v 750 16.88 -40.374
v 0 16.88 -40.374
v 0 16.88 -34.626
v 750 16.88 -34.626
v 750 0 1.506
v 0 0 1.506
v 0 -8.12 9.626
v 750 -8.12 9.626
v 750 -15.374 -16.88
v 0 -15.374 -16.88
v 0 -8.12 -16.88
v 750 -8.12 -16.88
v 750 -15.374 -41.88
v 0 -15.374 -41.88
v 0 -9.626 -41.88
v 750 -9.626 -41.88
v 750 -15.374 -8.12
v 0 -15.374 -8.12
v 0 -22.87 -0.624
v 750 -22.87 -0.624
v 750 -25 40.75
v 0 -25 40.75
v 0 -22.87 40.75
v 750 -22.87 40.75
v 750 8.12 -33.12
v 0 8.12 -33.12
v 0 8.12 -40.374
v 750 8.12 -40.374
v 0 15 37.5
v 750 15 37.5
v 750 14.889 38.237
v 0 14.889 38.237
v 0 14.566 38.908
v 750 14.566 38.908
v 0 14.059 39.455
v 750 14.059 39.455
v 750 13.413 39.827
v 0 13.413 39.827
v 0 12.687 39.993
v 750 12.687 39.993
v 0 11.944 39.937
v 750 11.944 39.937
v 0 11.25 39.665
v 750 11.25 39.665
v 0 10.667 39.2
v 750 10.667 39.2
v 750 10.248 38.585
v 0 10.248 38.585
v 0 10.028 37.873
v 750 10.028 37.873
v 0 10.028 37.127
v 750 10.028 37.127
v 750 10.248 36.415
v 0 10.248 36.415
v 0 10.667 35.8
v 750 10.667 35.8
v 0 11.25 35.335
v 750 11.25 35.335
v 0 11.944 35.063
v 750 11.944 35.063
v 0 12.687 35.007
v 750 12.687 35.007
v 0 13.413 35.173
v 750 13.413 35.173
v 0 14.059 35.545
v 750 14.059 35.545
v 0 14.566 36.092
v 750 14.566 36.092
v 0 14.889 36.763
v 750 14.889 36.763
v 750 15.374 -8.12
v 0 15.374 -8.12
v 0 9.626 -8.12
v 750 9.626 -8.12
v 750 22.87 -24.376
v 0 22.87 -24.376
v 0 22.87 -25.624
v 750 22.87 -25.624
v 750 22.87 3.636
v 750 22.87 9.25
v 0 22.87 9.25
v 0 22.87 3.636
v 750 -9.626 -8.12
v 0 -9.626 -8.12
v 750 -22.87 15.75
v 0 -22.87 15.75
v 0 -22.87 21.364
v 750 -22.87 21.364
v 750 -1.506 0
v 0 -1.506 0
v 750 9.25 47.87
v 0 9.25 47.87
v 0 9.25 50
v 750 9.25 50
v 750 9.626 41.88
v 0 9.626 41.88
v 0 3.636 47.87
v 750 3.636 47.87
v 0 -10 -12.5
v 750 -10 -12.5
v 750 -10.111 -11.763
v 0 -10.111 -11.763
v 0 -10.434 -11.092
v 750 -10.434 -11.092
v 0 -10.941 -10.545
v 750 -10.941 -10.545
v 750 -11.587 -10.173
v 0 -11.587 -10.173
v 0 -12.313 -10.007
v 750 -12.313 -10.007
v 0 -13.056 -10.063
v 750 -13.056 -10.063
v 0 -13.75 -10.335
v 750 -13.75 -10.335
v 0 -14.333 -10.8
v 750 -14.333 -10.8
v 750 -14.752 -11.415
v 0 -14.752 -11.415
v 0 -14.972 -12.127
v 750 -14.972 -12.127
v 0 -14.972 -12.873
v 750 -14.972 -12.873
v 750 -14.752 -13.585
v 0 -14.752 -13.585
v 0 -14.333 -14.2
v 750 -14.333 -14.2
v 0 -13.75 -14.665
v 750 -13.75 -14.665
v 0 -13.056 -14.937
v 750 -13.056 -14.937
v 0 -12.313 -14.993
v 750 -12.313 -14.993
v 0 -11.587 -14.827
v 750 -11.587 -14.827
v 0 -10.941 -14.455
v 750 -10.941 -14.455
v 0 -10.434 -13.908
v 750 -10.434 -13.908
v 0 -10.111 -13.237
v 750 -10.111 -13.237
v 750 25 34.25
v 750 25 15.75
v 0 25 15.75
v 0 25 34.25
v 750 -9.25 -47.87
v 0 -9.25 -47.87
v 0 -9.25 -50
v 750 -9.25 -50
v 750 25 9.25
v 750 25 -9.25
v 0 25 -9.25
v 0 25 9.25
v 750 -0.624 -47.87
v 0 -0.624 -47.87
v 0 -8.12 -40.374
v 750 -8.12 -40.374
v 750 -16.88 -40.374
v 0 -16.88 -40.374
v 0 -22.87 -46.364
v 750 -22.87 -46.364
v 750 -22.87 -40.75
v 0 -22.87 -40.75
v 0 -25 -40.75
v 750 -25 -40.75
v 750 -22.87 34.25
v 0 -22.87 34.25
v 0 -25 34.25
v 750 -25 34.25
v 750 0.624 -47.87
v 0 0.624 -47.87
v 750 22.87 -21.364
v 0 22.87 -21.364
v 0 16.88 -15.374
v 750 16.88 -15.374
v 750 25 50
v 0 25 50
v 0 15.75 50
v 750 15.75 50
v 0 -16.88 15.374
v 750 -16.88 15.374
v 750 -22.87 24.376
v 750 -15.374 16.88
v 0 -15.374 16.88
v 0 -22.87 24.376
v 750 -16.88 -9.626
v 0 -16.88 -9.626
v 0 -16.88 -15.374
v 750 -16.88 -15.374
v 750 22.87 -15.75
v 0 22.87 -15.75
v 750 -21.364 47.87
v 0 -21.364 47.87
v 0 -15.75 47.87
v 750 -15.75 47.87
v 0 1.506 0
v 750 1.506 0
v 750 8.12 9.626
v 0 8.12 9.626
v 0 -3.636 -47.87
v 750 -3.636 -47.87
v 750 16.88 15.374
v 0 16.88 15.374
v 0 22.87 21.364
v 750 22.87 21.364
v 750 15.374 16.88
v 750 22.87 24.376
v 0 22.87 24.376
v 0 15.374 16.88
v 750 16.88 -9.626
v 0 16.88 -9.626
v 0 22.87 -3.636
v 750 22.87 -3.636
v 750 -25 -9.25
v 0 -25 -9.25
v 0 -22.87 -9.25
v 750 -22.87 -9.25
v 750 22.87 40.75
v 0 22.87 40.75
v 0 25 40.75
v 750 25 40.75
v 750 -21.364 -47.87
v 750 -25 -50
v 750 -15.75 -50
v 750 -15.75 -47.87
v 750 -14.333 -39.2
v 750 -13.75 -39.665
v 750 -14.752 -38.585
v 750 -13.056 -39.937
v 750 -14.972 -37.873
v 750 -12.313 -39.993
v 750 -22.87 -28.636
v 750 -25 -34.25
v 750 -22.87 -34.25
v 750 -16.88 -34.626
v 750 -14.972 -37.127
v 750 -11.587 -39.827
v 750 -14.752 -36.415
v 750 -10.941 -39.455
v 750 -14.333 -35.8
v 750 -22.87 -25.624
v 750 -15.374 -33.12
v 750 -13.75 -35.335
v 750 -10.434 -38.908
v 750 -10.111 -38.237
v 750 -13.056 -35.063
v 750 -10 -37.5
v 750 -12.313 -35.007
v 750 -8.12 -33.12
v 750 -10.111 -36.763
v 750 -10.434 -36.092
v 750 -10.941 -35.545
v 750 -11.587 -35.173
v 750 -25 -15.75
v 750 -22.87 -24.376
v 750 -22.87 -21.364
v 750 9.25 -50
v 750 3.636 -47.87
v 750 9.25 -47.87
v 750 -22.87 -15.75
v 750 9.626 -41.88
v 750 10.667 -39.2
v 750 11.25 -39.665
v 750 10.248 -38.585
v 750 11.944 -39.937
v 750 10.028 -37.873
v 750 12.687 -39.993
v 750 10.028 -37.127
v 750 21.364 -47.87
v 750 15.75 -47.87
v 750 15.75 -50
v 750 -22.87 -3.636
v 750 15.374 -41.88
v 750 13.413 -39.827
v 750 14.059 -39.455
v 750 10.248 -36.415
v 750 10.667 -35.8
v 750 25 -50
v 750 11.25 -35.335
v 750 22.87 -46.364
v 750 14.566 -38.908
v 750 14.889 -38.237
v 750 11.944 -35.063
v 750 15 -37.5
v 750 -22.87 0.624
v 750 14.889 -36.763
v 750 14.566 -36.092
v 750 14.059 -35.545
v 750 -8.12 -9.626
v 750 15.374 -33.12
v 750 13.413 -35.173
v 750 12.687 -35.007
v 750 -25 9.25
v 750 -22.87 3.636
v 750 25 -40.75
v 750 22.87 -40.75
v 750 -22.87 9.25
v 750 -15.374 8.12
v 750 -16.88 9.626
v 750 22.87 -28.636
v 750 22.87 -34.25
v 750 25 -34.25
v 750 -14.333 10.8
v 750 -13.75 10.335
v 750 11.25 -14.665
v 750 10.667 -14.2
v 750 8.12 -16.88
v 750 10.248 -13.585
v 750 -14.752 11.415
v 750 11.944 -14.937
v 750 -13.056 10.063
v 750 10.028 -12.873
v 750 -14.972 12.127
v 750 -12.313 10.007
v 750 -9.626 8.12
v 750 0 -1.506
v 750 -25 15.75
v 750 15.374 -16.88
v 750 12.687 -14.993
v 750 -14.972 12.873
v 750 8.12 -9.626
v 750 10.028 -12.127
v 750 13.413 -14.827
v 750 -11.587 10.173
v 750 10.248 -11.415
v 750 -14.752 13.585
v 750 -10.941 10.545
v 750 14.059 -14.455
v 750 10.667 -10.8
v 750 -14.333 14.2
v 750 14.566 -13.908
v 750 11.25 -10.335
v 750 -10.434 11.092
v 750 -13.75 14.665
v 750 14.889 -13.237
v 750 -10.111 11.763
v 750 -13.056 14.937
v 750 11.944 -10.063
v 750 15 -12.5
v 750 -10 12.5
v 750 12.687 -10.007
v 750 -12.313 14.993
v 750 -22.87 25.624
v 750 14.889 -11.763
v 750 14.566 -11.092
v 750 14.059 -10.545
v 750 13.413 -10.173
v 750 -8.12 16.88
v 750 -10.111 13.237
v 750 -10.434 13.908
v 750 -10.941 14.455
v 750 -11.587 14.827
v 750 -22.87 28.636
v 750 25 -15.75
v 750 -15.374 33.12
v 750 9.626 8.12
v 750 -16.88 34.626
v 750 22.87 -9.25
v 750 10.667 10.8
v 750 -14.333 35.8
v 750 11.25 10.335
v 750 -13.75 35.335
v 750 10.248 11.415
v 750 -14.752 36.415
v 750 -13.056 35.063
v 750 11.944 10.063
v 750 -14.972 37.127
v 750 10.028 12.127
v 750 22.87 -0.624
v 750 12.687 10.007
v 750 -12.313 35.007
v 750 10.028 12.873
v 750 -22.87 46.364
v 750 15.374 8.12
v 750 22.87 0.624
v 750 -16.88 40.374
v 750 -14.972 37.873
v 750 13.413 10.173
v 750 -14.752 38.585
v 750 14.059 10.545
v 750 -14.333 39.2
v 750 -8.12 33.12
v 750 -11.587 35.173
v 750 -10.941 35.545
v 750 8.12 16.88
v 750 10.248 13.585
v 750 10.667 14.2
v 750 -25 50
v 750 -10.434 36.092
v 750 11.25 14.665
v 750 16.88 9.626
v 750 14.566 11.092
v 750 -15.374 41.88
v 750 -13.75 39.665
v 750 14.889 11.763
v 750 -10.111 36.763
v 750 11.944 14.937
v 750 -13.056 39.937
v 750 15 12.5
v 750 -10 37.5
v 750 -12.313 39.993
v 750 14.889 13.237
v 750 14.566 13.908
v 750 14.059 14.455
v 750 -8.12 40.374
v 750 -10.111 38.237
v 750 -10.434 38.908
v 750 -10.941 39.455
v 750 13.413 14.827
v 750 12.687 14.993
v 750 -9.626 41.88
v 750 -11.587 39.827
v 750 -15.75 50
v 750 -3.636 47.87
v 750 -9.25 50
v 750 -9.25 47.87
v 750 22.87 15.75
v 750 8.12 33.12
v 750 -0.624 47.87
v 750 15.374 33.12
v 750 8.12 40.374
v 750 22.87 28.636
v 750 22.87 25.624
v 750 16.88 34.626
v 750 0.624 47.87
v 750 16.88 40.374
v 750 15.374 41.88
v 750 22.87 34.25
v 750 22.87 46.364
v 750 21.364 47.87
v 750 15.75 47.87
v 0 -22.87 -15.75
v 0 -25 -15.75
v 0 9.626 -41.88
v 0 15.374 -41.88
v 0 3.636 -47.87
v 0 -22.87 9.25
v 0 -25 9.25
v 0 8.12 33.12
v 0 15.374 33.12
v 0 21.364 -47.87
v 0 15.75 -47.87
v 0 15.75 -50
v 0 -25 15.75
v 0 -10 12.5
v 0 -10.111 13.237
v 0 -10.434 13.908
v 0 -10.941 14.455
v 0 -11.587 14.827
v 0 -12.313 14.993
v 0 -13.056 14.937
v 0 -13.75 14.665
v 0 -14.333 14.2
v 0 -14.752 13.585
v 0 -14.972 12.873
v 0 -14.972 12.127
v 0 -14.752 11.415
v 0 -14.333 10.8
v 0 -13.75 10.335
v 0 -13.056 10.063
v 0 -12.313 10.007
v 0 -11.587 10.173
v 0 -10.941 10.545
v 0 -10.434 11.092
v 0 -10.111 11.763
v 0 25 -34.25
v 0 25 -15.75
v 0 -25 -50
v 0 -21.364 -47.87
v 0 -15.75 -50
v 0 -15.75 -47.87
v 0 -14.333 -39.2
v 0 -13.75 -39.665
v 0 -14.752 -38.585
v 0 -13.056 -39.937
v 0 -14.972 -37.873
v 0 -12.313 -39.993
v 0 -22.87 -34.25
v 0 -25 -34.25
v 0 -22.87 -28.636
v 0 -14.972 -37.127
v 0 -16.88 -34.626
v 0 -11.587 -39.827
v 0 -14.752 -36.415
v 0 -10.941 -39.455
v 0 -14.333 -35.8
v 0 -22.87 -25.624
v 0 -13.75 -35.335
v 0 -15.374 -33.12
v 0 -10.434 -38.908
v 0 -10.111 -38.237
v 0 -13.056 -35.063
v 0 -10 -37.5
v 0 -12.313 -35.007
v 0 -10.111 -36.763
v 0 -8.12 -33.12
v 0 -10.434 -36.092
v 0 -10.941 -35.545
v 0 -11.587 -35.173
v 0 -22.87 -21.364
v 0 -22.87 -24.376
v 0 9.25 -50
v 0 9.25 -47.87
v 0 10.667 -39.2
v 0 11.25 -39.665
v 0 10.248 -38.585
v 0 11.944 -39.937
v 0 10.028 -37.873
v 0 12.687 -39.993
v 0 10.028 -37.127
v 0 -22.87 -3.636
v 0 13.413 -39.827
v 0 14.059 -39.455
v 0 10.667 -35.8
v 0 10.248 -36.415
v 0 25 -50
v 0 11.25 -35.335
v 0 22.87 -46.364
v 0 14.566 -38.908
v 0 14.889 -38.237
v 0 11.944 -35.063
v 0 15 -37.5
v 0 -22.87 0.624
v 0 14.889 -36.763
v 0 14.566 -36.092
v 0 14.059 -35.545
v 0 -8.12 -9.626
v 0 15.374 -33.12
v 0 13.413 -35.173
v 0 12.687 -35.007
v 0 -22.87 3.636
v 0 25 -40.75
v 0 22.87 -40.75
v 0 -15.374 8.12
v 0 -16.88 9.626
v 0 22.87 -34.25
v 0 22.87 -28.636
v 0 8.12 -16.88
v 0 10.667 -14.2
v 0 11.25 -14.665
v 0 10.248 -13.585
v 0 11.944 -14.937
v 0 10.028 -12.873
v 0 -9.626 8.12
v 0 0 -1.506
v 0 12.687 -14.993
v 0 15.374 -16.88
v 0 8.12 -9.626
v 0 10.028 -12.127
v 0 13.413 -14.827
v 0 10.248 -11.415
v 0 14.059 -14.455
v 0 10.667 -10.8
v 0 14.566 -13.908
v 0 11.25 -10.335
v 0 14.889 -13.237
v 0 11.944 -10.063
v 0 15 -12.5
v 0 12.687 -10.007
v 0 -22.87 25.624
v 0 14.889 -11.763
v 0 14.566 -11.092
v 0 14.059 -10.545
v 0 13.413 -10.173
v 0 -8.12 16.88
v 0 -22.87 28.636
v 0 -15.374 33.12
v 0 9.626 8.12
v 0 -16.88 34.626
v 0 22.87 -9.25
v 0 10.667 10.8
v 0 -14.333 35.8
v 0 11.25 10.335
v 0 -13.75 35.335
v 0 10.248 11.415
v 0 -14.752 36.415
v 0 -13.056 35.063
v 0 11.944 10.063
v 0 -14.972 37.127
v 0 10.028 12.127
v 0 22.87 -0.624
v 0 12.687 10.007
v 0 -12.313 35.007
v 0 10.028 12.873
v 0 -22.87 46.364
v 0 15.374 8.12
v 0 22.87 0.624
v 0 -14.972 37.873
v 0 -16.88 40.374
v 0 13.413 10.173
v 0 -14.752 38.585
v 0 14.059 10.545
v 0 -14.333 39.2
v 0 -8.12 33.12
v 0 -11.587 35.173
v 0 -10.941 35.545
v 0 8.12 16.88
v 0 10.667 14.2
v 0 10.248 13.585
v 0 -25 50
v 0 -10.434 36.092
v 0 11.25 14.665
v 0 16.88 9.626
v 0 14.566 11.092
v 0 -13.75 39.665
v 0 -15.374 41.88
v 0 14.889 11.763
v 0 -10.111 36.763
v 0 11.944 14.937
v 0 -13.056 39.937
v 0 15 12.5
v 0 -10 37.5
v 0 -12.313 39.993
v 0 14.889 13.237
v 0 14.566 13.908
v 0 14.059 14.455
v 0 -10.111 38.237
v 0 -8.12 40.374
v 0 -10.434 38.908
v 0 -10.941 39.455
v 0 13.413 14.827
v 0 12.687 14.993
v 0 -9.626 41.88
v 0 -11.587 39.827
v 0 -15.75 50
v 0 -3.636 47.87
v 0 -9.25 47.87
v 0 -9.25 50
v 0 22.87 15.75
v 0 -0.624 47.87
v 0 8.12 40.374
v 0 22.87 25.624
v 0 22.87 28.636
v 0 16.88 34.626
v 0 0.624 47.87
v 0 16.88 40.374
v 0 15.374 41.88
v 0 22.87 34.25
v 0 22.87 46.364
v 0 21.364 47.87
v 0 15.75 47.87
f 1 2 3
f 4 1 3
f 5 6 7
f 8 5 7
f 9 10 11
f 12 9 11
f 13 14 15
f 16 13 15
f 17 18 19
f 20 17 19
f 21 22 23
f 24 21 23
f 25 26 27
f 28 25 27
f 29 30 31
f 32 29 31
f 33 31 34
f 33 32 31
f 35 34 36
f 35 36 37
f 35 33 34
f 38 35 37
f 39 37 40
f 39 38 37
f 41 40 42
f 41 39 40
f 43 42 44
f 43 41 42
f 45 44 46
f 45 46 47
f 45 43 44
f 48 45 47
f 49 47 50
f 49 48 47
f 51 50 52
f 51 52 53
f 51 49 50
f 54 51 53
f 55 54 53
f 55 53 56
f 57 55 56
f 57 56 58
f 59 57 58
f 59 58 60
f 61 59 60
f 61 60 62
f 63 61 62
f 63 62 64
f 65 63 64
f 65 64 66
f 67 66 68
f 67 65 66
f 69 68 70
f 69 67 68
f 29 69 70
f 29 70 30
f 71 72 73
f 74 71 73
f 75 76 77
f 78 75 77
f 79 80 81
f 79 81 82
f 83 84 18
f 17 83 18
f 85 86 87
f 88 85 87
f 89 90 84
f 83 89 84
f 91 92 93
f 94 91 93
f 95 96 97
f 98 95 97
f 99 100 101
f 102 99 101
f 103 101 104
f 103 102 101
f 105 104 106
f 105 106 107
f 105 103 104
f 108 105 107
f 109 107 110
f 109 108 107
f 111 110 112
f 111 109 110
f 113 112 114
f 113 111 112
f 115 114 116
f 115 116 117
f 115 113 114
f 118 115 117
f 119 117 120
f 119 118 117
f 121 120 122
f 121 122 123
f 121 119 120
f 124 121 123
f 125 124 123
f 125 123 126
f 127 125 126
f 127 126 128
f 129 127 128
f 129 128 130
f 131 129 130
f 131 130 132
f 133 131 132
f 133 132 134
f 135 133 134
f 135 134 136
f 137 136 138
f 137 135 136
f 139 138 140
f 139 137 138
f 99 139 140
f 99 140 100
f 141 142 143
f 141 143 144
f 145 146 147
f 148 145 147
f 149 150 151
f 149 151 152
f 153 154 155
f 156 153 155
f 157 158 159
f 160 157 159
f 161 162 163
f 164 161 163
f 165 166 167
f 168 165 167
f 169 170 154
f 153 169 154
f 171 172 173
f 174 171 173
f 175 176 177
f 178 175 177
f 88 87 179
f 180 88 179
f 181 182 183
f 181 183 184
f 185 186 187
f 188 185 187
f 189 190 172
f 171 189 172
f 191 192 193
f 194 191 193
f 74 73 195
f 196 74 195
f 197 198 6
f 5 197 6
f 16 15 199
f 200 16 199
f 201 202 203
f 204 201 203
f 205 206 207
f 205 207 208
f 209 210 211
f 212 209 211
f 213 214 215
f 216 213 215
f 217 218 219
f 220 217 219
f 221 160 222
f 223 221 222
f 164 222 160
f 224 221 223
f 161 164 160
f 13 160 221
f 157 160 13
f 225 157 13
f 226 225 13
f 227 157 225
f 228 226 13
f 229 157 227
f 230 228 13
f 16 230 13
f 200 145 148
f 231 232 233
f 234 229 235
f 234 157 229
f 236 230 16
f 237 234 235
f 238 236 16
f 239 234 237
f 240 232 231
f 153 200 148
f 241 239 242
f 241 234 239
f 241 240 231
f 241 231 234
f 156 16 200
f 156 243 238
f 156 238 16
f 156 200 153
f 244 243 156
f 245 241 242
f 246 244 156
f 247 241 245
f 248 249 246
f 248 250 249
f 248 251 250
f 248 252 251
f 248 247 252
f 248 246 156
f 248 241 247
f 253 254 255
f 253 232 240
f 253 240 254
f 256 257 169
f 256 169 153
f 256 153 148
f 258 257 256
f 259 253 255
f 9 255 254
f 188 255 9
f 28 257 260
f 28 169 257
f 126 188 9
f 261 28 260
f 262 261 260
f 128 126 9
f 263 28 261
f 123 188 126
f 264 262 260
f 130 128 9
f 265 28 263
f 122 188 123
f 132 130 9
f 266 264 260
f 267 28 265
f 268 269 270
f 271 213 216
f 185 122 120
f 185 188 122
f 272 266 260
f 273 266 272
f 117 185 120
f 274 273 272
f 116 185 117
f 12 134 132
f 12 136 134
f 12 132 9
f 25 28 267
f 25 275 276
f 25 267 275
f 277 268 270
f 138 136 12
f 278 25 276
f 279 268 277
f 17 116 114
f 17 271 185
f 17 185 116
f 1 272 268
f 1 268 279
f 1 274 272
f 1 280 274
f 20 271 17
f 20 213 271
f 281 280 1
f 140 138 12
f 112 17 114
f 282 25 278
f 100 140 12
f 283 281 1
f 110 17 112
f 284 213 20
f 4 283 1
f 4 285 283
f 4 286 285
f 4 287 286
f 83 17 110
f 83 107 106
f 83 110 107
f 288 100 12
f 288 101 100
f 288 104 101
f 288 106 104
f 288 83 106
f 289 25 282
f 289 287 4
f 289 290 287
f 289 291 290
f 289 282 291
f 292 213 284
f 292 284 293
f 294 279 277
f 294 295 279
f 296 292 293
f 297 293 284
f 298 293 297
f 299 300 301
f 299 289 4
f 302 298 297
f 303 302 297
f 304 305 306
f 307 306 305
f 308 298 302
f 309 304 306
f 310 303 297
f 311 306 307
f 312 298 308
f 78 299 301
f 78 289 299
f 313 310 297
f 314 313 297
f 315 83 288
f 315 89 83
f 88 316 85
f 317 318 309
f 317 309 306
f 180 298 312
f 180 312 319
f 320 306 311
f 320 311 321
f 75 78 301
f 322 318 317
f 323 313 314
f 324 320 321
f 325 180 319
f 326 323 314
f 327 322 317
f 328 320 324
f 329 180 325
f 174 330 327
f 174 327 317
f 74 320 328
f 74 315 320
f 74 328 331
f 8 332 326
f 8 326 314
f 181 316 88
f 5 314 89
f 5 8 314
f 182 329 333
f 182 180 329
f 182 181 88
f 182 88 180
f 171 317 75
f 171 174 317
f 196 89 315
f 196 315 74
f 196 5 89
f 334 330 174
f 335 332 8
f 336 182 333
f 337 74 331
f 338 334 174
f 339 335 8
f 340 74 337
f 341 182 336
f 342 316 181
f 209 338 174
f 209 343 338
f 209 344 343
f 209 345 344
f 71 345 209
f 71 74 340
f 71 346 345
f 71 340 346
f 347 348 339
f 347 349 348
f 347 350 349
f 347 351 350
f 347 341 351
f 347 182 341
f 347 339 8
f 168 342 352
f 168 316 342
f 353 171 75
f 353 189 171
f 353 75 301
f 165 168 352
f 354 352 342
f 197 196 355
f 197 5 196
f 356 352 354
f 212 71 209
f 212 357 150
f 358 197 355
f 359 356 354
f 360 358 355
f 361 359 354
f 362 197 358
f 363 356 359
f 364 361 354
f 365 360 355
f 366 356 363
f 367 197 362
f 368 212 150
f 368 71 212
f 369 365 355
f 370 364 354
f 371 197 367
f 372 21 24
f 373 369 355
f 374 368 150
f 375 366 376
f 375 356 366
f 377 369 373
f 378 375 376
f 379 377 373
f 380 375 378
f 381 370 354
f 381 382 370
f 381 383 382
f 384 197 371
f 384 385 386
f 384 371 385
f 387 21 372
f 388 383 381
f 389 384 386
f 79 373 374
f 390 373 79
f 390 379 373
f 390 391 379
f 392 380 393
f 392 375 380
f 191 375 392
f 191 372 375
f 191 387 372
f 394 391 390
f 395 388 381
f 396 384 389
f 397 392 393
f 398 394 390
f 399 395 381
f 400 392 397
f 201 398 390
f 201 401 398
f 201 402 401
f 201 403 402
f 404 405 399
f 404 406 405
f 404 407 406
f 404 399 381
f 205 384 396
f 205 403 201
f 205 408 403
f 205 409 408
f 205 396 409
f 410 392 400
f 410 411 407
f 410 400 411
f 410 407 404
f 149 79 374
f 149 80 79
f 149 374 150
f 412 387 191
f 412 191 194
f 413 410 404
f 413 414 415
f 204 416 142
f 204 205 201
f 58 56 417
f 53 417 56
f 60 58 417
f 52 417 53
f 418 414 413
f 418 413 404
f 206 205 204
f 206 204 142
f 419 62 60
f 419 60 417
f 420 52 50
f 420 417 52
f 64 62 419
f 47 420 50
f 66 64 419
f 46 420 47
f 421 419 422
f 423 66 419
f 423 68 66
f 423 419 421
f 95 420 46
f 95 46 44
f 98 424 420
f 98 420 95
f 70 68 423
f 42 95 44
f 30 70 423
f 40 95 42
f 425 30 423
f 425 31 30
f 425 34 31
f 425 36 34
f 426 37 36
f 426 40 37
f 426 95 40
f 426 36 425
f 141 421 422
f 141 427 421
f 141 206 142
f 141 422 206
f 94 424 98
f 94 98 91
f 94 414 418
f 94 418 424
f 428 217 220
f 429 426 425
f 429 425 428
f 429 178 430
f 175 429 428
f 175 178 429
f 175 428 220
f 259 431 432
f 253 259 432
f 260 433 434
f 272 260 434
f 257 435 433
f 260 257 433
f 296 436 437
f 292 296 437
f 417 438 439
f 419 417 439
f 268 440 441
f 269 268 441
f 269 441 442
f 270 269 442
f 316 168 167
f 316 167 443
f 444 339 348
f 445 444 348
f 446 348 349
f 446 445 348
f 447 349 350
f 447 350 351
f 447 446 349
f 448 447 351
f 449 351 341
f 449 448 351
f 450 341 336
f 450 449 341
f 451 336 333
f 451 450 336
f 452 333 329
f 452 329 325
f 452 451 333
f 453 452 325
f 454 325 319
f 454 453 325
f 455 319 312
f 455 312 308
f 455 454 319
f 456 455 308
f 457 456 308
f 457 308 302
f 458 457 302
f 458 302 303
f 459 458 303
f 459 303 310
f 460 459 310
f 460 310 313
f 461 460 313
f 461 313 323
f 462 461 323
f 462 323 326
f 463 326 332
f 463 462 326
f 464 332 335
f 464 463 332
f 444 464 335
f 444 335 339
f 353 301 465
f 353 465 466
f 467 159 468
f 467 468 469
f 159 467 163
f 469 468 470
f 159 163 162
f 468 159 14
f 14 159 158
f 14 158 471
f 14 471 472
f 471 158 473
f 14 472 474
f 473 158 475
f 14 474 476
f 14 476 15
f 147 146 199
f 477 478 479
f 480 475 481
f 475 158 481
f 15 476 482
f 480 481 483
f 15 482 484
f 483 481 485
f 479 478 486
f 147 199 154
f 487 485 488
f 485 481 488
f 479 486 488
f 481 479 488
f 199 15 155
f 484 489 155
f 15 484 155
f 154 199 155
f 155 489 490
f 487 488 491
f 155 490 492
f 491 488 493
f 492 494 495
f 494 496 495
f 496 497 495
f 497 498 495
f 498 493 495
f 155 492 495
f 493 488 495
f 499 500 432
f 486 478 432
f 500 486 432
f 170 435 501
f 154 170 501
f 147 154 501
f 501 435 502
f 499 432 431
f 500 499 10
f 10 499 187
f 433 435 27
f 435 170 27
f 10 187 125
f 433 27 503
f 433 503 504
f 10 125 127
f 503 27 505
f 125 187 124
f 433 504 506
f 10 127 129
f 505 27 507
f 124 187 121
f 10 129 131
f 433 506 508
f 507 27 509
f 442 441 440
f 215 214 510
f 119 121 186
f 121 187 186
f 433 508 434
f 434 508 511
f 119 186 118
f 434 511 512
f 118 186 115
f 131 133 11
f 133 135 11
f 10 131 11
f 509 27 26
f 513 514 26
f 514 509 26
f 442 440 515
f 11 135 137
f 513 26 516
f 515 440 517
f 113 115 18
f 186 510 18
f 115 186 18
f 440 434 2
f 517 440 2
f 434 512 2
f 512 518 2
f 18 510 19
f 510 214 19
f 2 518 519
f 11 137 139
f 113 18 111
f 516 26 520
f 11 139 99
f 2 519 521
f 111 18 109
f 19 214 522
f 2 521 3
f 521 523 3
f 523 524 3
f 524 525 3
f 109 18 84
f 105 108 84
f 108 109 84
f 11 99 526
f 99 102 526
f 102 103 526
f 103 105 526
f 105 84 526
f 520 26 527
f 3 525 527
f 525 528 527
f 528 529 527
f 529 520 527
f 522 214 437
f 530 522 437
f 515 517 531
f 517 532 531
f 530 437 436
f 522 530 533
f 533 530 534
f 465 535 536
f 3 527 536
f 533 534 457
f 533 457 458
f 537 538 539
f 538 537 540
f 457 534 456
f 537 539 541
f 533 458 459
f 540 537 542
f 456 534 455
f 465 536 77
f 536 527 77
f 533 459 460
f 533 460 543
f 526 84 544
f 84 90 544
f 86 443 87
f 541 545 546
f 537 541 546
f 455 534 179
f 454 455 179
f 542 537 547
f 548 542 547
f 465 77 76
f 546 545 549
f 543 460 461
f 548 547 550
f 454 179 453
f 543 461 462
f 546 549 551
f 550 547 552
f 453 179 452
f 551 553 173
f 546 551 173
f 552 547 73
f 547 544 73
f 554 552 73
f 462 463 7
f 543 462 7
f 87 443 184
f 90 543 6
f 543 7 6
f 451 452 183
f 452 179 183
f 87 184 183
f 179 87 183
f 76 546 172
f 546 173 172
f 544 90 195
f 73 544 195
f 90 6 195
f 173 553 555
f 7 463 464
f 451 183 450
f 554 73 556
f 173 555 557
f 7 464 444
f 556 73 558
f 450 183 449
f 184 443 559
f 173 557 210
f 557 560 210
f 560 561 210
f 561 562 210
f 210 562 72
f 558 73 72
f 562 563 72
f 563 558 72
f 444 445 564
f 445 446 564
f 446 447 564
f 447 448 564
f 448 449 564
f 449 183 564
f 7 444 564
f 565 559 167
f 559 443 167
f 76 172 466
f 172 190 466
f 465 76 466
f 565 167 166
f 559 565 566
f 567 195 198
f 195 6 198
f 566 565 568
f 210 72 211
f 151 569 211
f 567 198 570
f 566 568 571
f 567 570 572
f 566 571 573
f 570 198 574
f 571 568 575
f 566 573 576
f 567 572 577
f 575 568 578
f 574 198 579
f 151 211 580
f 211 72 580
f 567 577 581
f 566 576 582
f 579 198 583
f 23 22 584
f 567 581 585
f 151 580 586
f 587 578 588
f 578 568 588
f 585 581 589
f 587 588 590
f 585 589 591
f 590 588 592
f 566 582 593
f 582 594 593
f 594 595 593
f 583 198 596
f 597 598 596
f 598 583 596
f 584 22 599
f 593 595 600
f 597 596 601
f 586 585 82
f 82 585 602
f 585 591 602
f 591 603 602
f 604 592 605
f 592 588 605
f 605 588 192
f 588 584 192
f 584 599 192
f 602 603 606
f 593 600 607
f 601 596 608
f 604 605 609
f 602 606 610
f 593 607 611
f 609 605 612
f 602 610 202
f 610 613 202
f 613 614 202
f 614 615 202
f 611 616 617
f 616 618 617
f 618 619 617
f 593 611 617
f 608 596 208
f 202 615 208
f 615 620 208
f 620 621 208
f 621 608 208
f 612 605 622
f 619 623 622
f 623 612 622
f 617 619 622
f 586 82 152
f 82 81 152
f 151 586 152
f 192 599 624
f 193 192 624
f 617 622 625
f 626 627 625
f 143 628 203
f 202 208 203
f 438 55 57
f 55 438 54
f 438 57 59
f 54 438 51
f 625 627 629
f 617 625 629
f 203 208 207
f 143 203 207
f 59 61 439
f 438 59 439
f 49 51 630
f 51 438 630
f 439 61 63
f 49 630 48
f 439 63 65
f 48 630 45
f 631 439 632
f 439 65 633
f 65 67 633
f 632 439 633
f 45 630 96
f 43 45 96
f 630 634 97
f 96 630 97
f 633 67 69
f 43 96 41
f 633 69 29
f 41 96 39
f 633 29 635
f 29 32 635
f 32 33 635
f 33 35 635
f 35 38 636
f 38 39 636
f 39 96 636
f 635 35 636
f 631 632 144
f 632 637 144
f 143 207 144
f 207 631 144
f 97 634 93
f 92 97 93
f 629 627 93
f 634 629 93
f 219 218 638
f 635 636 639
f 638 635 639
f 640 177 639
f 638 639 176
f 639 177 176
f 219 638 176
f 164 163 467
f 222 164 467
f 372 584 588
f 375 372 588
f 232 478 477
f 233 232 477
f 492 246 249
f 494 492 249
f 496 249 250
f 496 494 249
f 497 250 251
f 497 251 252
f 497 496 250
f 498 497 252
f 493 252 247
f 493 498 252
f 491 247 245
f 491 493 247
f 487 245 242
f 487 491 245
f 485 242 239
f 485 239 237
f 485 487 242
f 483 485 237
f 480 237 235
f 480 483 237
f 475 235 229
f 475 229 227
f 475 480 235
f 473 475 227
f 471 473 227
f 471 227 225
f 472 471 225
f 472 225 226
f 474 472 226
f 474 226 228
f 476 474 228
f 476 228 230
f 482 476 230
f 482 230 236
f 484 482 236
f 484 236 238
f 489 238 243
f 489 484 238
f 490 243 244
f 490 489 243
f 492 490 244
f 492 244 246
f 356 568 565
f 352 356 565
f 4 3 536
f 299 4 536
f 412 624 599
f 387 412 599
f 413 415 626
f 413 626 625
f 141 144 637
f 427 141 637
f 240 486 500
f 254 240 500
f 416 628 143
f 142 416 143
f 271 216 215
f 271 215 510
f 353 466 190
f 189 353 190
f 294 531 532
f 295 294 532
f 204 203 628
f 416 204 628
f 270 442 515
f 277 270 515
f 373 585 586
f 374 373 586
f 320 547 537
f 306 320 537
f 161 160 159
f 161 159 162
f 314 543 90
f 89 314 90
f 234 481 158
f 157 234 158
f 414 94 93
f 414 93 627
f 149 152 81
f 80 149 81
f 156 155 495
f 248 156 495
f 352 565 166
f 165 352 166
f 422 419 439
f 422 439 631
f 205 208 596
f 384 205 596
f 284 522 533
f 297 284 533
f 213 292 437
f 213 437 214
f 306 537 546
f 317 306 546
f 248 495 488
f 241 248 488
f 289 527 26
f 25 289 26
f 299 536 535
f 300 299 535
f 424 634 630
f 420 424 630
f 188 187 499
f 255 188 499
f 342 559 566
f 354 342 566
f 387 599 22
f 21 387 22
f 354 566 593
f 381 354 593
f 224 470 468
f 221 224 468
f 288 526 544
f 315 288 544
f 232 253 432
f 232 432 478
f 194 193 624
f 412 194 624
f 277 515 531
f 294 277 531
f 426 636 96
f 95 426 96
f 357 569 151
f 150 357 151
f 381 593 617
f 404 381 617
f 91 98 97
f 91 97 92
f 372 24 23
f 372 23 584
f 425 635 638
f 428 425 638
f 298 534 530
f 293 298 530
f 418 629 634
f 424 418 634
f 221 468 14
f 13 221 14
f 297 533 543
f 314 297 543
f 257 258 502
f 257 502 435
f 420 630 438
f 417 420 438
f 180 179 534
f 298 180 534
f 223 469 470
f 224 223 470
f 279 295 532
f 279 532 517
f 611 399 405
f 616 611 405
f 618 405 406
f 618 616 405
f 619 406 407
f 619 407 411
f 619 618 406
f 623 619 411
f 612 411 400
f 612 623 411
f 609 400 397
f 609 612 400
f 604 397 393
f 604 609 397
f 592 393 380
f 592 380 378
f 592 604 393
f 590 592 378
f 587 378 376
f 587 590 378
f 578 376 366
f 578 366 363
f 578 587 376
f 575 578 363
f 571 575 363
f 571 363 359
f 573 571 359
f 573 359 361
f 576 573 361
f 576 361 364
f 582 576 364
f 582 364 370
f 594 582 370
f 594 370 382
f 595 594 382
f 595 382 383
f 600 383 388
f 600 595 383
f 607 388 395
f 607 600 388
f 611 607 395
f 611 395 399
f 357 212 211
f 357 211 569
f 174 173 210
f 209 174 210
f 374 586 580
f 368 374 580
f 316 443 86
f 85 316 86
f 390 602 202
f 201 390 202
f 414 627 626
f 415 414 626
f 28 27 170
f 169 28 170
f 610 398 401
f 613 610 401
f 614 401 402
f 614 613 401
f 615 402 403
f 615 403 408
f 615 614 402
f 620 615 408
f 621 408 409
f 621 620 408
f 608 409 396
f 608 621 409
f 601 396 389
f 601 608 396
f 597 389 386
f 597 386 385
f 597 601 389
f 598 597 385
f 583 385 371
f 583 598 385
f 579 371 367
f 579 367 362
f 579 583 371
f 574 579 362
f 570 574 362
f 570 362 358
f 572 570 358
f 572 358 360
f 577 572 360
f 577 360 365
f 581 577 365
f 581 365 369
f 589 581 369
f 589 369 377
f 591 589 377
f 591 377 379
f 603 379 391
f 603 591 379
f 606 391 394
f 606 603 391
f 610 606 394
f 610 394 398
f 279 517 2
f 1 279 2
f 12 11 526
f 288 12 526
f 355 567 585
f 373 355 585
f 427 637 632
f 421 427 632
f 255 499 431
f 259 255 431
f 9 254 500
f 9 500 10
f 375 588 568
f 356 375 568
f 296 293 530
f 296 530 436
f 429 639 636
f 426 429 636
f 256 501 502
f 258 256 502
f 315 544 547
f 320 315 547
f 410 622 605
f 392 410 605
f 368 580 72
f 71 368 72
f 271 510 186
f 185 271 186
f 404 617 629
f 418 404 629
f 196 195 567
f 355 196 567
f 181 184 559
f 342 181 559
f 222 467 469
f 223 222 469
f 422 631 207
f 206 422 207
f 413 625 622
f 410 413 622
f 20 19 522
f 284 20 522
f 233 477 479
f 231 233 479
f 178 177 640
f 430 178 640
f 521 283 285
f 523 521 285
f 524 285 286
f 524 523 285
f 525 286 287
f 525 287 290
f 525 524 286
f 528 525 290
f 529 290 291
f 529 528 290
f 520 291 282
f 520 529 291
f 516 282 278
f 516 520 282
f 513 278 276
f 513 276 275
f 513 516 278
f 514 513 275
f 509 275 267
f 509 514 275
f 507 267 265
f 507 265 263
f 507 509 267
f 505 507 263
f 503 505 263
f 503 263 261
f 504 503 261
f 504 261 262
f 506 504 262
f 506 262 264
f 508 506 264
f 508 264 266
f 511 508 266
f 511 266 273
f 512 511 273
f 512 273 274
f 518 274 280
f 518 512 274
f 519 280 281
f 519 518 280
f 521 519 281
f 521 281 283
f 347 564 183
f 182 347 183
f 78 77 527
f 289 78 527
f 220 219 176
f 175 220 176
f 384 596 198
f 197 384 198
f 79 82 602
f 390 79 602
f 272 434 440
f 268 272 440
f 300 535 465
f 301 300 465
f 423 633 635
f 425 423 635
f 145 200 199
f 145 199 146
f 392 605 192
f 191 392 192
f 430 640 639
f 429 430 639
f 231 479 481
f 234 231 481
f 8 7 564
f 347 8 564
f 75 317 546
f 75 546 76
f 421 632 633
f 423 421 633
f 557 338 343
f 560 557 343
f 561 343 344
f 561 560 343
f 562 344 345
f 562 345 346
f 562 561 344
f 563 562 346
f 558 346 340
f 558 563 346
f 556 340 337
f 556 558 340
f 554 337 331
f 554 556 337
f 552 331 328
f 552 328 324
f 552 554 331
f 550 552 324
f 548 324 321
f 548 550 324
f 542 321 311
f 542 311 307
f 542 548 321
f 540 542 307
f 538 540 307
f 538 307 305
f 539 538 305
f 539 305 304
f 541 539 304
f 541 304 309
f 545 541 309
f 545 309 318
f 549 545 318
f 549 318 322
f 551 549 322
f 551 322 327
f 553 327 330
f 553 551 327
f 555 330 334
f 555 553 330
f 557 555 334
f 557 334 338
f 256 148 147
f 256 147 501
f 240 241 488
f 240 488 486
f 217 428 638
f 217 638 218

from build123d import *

# Parameters (mm, degrees)
F0_R     = 2.5
F1_DEPTH = 750


with BuildPart() as f1:
    # F0 (on Right) → F1 (new body)
    with BuildSketch(Plane.YZ):
        Polygon((-22.87, 25.623863), (-15.373863, 33.12), (-16.88, 33.12), (-16.88, 34.626137), (-22.87, 28.636137), (-22.87, 34.25), (-25, 34.25), (-25, 15.75), (-22.87, 15.75), (-22.87, 21.363863), (-16.88, 15.373863), (-16.88, 16.88), (-15.373863, 16.88), (-22.87, 24.376137), align=None)
        Polygon((-8.12, 40.373863), (-8.12, 41.88), (-9.626137, 41.88), (-15.373863, 41.88), (-16.88, 41.88), (-16.88, 40.373863), (-16.88, 34.626137), (-16.88, 33.12), (-15.373863, 33.12), (-8.12, 33.12), align=None)
        with Locations((-12.5, 37.5)):
            Circle(F0_R, mode=Mode.SUBTRACT)
        Polygon((-16.88, 41.88), (-15.373863, 41.88), (-21.363863, 47.87), (-15.75, 47.87), (-15.75, 50), (-25, 50), (-25, 40.75), (-22.87, 40.75), (-22.87, 46.363863), (-16.88, 40.373863), align=None)
        Polygon((-9.626137, 41.88), (-8.12, 41.88), (-8.12, 40.373863), (-0.623863, 47.87), (0, 47.87), (0.623863, 47.87), (8.12, 40.373863), (8.12, 41.88), (9.626137, 41.88), (3.636137, 47.87), (9.25, 47.87), (9.25, 50), (0, 50), (-9.25, 50), (-9.25, 47.87), (-3.636137, 47.87), align=None)
        Polygon((8.12, 41.88), (8.12, 40.373863), (8.12, 33.12), (15.373863, 33.12), (16.88, 33.12), (16.88, 34.626137), (16.88, 40.373863), (16.88, 41.88), (15.373863, 41.88), (9.626137, 41.88), align=None)
        with Locations((12.5, 37.5)):
            Circle(F0_R, mode=Mode.SUBTRACT)
        Polygon((-0.623863, -47.87), (-8.12, -40.373863), (-8.12, -41.88), (-9.626137, -41.88), (-3.636137, -47.87), (-9.25, -47.87), (-9.25, -50), (0, -50), (9.25, -50), (9.25, -47.87), (3.636137, -47.87), (9.626137, -41.88), (8.12, -41.88), (8.12, -40.373863), (0.623863, -47.87), (0, -47.87), align=None)
        Polygon((15.373863, -8.12), (9.626137, -8.12), (8.12, -8.12), (8.12, -9.626137), (8.12, -16.88), (15.373863, -16.88), (16.88, -16.88), (16.88, -15.373863), (16.88, -9.626137), (16.88, -8.12), align=None)
        with Locations((12.5, -12.5)):
            Circle(F0_R, mode=Mode.SUBTRACT)
        Polygon((16.88, -16.88), (15.373863, -16.88), (22.87, -24.376137), (22.87, -25.623863), (15.373863, -33.12), (16.88, -33.12), (16.88, -34.626137), (22.87, -28.636137), (22.87, -34.25), (25, -34.25), (25, -15.75), (22.87, -15.75), (22.87, -21.363863), (16.88, -15.373863), align=None)
        Polygon((-8.12, 16.88), (-15.373863, 16.88), (-16.88, 16.88), (-16.88, 15.373863), (-16.88, 9.626137), (-16.88, 8.12), (-15.373863, 8.12), (-9.626137, 8.12), (-8.12, 8.12), (-8.12, 9.626137), align=None)
        with Locations((-12.5, 12.5)):
            Circle(F0_R, mode=Mode.SUBTRACT)
        Polygon((8.12, 16.88), (8.12, 9.626137), (8.12, 8.12), (9.626137, 8.12), (15.373863, 8.12), (16.88, 8.12), (16.88, 9.626137), (16.88, 15.373863), (16.88, 16.88), (15.373863, 16.88), align=None)
        with Locations((12.5, 12.5)):
            Circle(F0_R, mode=Mode.SUBTRACT)
        Polygon((-22.87, -24.376137), (-15.373863, -16.88), (-16.88, -16.88), (-16.88, -15.373863), (-22.87, -21.363863), (-22.87, -15.75), (-25, -15.75), (-25, -34.25), (-22.87, -34.25), (-22.87, -28.636137), (-16.88, -34.626137), (-16.88, -33.12), (-15.373863, -33.12), (-22.87, -25.623863), align=None)
        Polygon((-8.12, -8.12), (-9.626137, -8.12), (-15.373863, -8.12), (-16.88, -8.12), (-16.88, -9.626137), (-16.88, -15.373863), (-16.88, -16.88), (-15.373863, -16.88), (-8.12, -16.88), (-8.12, -9.626137), align=None)
        with Locations((-12.5, -12.5)):
            Circle(F0_R, mode=Mode.SUBTRACT)
        Polygon((16.88, 8.12), (15.373863, 8.12), (22.87, 0.623863), (22.87, 0), (22.87, -0.623863), (15.373863, -8.12), (16.88, -8.12), (16.88, -9.626137), (22.87, -3.636137), (22.87, -9.25), (25, -9.25), (25, 0), (25, 9.25), (22.87, 9.25), (22.87, 3.636137), (16.88, 9.626137), align=None)
        Polygon((16.88, 33.12), (15.373863, 33.12), (22.87, 25.623863), (22.87, 24.376137), (15.373863, 16.88), (16.88, 16.88), (16.88, 15.373863), (22.87, 21.363863), (22.87, 15.75), (25, 15.75), (25, 34.25), (22.87, 34.25), (22.87, 28.636137), (16.88, 34.626137), align=None)
        Polygon((-16.88, 8.12), (-16.88, 9.626137), (-22.87, 3.636137), (-22.87, 9.25), (-25, 9.25), (-25, 0), (-25, -9.25), (-22.87, -9.25), (-22.87, -3.636137), (-16.88, -9.626137), (-16.88, -8.12), (-15.373863, -8.12), (-22.87, -0.623863), (-22.87, 0), (-22.87, 0.623863), (-15.373863, 8.12), align=None)
        Polygon((21.363863, 47.87), (15.373863, 41.88), (16.88, 41.88), (16.88, 40.373863), (22.87, 46.363863), (22.87, 40.75), (25, 40.75), (25, 50), (15.75, 50), (15.75, 47.87), align=None)
        Polygon((22.87, -46.363863), (16.88, -40.373863), (16.88, -41.88), (15.373863, -41.88), (21.363863, -47.87), (15.75, -47.87), (15.75, -50), (25, -50), (25, -40.75), (22.87, -40.75), align=None)
        Polygon((-16.88, -41.88), (-16.88, -40.373863), (-22.87, -46.363863), (-22.87, -40.75), (-25, -40.75), (-25, -50), (-15.75, -50), (-15.75, -47.87), (-21.363863, -47.87), (-15.373863, -41.88), align=None)
        Polygon((16.88, -33.12), (15.373863, -33.12), (8.12, -33.12), (8.12, -40.373863), (8.12, -41.88), (9.626137, -41.88), (15.373863, -41.88), (16.88, -41.88), (16.88, -40.373863), (16.88, -34.626137), align=None)
        with Locations((12.5, -37.5)):
            Circle(F0_R, mode=Mode.SUBTRACT)
        Polygon((0, 1.506137), (-8.12, 9.626137), (-8.12, 8.12), (-9.626137, 8.12), (-1.506137, 0), (-9.626137, -8.12), (-8.12, -8.12), (-8.12, -9.626137), (0, -1.506137), (8.12, -9.626137), (8.12, -8.12), (9.626137, -8.12), (1.506137, 0), (9.626137, 8.12), (8.12, 8.12), (8.12, 9.626137), align=None)
        Polygon((-8.12, -33.12), (-15.373863, -33.12), (-16.88, -33.12), (-16.88, -34.626137), (-16.88, -40.373863), (-16.88, -41.88), (-15.373863, -41.88), (-9.626137, -41.88), (-8.12, -41.88), (-8.12, -40.373863), align=None)
        with Locations((-12.5, -37.5)):
            Circle(F0_R, mode=Mode.SUBTRACT)
    extrude(amount=F1_DEPTH)


solid = f1.part
